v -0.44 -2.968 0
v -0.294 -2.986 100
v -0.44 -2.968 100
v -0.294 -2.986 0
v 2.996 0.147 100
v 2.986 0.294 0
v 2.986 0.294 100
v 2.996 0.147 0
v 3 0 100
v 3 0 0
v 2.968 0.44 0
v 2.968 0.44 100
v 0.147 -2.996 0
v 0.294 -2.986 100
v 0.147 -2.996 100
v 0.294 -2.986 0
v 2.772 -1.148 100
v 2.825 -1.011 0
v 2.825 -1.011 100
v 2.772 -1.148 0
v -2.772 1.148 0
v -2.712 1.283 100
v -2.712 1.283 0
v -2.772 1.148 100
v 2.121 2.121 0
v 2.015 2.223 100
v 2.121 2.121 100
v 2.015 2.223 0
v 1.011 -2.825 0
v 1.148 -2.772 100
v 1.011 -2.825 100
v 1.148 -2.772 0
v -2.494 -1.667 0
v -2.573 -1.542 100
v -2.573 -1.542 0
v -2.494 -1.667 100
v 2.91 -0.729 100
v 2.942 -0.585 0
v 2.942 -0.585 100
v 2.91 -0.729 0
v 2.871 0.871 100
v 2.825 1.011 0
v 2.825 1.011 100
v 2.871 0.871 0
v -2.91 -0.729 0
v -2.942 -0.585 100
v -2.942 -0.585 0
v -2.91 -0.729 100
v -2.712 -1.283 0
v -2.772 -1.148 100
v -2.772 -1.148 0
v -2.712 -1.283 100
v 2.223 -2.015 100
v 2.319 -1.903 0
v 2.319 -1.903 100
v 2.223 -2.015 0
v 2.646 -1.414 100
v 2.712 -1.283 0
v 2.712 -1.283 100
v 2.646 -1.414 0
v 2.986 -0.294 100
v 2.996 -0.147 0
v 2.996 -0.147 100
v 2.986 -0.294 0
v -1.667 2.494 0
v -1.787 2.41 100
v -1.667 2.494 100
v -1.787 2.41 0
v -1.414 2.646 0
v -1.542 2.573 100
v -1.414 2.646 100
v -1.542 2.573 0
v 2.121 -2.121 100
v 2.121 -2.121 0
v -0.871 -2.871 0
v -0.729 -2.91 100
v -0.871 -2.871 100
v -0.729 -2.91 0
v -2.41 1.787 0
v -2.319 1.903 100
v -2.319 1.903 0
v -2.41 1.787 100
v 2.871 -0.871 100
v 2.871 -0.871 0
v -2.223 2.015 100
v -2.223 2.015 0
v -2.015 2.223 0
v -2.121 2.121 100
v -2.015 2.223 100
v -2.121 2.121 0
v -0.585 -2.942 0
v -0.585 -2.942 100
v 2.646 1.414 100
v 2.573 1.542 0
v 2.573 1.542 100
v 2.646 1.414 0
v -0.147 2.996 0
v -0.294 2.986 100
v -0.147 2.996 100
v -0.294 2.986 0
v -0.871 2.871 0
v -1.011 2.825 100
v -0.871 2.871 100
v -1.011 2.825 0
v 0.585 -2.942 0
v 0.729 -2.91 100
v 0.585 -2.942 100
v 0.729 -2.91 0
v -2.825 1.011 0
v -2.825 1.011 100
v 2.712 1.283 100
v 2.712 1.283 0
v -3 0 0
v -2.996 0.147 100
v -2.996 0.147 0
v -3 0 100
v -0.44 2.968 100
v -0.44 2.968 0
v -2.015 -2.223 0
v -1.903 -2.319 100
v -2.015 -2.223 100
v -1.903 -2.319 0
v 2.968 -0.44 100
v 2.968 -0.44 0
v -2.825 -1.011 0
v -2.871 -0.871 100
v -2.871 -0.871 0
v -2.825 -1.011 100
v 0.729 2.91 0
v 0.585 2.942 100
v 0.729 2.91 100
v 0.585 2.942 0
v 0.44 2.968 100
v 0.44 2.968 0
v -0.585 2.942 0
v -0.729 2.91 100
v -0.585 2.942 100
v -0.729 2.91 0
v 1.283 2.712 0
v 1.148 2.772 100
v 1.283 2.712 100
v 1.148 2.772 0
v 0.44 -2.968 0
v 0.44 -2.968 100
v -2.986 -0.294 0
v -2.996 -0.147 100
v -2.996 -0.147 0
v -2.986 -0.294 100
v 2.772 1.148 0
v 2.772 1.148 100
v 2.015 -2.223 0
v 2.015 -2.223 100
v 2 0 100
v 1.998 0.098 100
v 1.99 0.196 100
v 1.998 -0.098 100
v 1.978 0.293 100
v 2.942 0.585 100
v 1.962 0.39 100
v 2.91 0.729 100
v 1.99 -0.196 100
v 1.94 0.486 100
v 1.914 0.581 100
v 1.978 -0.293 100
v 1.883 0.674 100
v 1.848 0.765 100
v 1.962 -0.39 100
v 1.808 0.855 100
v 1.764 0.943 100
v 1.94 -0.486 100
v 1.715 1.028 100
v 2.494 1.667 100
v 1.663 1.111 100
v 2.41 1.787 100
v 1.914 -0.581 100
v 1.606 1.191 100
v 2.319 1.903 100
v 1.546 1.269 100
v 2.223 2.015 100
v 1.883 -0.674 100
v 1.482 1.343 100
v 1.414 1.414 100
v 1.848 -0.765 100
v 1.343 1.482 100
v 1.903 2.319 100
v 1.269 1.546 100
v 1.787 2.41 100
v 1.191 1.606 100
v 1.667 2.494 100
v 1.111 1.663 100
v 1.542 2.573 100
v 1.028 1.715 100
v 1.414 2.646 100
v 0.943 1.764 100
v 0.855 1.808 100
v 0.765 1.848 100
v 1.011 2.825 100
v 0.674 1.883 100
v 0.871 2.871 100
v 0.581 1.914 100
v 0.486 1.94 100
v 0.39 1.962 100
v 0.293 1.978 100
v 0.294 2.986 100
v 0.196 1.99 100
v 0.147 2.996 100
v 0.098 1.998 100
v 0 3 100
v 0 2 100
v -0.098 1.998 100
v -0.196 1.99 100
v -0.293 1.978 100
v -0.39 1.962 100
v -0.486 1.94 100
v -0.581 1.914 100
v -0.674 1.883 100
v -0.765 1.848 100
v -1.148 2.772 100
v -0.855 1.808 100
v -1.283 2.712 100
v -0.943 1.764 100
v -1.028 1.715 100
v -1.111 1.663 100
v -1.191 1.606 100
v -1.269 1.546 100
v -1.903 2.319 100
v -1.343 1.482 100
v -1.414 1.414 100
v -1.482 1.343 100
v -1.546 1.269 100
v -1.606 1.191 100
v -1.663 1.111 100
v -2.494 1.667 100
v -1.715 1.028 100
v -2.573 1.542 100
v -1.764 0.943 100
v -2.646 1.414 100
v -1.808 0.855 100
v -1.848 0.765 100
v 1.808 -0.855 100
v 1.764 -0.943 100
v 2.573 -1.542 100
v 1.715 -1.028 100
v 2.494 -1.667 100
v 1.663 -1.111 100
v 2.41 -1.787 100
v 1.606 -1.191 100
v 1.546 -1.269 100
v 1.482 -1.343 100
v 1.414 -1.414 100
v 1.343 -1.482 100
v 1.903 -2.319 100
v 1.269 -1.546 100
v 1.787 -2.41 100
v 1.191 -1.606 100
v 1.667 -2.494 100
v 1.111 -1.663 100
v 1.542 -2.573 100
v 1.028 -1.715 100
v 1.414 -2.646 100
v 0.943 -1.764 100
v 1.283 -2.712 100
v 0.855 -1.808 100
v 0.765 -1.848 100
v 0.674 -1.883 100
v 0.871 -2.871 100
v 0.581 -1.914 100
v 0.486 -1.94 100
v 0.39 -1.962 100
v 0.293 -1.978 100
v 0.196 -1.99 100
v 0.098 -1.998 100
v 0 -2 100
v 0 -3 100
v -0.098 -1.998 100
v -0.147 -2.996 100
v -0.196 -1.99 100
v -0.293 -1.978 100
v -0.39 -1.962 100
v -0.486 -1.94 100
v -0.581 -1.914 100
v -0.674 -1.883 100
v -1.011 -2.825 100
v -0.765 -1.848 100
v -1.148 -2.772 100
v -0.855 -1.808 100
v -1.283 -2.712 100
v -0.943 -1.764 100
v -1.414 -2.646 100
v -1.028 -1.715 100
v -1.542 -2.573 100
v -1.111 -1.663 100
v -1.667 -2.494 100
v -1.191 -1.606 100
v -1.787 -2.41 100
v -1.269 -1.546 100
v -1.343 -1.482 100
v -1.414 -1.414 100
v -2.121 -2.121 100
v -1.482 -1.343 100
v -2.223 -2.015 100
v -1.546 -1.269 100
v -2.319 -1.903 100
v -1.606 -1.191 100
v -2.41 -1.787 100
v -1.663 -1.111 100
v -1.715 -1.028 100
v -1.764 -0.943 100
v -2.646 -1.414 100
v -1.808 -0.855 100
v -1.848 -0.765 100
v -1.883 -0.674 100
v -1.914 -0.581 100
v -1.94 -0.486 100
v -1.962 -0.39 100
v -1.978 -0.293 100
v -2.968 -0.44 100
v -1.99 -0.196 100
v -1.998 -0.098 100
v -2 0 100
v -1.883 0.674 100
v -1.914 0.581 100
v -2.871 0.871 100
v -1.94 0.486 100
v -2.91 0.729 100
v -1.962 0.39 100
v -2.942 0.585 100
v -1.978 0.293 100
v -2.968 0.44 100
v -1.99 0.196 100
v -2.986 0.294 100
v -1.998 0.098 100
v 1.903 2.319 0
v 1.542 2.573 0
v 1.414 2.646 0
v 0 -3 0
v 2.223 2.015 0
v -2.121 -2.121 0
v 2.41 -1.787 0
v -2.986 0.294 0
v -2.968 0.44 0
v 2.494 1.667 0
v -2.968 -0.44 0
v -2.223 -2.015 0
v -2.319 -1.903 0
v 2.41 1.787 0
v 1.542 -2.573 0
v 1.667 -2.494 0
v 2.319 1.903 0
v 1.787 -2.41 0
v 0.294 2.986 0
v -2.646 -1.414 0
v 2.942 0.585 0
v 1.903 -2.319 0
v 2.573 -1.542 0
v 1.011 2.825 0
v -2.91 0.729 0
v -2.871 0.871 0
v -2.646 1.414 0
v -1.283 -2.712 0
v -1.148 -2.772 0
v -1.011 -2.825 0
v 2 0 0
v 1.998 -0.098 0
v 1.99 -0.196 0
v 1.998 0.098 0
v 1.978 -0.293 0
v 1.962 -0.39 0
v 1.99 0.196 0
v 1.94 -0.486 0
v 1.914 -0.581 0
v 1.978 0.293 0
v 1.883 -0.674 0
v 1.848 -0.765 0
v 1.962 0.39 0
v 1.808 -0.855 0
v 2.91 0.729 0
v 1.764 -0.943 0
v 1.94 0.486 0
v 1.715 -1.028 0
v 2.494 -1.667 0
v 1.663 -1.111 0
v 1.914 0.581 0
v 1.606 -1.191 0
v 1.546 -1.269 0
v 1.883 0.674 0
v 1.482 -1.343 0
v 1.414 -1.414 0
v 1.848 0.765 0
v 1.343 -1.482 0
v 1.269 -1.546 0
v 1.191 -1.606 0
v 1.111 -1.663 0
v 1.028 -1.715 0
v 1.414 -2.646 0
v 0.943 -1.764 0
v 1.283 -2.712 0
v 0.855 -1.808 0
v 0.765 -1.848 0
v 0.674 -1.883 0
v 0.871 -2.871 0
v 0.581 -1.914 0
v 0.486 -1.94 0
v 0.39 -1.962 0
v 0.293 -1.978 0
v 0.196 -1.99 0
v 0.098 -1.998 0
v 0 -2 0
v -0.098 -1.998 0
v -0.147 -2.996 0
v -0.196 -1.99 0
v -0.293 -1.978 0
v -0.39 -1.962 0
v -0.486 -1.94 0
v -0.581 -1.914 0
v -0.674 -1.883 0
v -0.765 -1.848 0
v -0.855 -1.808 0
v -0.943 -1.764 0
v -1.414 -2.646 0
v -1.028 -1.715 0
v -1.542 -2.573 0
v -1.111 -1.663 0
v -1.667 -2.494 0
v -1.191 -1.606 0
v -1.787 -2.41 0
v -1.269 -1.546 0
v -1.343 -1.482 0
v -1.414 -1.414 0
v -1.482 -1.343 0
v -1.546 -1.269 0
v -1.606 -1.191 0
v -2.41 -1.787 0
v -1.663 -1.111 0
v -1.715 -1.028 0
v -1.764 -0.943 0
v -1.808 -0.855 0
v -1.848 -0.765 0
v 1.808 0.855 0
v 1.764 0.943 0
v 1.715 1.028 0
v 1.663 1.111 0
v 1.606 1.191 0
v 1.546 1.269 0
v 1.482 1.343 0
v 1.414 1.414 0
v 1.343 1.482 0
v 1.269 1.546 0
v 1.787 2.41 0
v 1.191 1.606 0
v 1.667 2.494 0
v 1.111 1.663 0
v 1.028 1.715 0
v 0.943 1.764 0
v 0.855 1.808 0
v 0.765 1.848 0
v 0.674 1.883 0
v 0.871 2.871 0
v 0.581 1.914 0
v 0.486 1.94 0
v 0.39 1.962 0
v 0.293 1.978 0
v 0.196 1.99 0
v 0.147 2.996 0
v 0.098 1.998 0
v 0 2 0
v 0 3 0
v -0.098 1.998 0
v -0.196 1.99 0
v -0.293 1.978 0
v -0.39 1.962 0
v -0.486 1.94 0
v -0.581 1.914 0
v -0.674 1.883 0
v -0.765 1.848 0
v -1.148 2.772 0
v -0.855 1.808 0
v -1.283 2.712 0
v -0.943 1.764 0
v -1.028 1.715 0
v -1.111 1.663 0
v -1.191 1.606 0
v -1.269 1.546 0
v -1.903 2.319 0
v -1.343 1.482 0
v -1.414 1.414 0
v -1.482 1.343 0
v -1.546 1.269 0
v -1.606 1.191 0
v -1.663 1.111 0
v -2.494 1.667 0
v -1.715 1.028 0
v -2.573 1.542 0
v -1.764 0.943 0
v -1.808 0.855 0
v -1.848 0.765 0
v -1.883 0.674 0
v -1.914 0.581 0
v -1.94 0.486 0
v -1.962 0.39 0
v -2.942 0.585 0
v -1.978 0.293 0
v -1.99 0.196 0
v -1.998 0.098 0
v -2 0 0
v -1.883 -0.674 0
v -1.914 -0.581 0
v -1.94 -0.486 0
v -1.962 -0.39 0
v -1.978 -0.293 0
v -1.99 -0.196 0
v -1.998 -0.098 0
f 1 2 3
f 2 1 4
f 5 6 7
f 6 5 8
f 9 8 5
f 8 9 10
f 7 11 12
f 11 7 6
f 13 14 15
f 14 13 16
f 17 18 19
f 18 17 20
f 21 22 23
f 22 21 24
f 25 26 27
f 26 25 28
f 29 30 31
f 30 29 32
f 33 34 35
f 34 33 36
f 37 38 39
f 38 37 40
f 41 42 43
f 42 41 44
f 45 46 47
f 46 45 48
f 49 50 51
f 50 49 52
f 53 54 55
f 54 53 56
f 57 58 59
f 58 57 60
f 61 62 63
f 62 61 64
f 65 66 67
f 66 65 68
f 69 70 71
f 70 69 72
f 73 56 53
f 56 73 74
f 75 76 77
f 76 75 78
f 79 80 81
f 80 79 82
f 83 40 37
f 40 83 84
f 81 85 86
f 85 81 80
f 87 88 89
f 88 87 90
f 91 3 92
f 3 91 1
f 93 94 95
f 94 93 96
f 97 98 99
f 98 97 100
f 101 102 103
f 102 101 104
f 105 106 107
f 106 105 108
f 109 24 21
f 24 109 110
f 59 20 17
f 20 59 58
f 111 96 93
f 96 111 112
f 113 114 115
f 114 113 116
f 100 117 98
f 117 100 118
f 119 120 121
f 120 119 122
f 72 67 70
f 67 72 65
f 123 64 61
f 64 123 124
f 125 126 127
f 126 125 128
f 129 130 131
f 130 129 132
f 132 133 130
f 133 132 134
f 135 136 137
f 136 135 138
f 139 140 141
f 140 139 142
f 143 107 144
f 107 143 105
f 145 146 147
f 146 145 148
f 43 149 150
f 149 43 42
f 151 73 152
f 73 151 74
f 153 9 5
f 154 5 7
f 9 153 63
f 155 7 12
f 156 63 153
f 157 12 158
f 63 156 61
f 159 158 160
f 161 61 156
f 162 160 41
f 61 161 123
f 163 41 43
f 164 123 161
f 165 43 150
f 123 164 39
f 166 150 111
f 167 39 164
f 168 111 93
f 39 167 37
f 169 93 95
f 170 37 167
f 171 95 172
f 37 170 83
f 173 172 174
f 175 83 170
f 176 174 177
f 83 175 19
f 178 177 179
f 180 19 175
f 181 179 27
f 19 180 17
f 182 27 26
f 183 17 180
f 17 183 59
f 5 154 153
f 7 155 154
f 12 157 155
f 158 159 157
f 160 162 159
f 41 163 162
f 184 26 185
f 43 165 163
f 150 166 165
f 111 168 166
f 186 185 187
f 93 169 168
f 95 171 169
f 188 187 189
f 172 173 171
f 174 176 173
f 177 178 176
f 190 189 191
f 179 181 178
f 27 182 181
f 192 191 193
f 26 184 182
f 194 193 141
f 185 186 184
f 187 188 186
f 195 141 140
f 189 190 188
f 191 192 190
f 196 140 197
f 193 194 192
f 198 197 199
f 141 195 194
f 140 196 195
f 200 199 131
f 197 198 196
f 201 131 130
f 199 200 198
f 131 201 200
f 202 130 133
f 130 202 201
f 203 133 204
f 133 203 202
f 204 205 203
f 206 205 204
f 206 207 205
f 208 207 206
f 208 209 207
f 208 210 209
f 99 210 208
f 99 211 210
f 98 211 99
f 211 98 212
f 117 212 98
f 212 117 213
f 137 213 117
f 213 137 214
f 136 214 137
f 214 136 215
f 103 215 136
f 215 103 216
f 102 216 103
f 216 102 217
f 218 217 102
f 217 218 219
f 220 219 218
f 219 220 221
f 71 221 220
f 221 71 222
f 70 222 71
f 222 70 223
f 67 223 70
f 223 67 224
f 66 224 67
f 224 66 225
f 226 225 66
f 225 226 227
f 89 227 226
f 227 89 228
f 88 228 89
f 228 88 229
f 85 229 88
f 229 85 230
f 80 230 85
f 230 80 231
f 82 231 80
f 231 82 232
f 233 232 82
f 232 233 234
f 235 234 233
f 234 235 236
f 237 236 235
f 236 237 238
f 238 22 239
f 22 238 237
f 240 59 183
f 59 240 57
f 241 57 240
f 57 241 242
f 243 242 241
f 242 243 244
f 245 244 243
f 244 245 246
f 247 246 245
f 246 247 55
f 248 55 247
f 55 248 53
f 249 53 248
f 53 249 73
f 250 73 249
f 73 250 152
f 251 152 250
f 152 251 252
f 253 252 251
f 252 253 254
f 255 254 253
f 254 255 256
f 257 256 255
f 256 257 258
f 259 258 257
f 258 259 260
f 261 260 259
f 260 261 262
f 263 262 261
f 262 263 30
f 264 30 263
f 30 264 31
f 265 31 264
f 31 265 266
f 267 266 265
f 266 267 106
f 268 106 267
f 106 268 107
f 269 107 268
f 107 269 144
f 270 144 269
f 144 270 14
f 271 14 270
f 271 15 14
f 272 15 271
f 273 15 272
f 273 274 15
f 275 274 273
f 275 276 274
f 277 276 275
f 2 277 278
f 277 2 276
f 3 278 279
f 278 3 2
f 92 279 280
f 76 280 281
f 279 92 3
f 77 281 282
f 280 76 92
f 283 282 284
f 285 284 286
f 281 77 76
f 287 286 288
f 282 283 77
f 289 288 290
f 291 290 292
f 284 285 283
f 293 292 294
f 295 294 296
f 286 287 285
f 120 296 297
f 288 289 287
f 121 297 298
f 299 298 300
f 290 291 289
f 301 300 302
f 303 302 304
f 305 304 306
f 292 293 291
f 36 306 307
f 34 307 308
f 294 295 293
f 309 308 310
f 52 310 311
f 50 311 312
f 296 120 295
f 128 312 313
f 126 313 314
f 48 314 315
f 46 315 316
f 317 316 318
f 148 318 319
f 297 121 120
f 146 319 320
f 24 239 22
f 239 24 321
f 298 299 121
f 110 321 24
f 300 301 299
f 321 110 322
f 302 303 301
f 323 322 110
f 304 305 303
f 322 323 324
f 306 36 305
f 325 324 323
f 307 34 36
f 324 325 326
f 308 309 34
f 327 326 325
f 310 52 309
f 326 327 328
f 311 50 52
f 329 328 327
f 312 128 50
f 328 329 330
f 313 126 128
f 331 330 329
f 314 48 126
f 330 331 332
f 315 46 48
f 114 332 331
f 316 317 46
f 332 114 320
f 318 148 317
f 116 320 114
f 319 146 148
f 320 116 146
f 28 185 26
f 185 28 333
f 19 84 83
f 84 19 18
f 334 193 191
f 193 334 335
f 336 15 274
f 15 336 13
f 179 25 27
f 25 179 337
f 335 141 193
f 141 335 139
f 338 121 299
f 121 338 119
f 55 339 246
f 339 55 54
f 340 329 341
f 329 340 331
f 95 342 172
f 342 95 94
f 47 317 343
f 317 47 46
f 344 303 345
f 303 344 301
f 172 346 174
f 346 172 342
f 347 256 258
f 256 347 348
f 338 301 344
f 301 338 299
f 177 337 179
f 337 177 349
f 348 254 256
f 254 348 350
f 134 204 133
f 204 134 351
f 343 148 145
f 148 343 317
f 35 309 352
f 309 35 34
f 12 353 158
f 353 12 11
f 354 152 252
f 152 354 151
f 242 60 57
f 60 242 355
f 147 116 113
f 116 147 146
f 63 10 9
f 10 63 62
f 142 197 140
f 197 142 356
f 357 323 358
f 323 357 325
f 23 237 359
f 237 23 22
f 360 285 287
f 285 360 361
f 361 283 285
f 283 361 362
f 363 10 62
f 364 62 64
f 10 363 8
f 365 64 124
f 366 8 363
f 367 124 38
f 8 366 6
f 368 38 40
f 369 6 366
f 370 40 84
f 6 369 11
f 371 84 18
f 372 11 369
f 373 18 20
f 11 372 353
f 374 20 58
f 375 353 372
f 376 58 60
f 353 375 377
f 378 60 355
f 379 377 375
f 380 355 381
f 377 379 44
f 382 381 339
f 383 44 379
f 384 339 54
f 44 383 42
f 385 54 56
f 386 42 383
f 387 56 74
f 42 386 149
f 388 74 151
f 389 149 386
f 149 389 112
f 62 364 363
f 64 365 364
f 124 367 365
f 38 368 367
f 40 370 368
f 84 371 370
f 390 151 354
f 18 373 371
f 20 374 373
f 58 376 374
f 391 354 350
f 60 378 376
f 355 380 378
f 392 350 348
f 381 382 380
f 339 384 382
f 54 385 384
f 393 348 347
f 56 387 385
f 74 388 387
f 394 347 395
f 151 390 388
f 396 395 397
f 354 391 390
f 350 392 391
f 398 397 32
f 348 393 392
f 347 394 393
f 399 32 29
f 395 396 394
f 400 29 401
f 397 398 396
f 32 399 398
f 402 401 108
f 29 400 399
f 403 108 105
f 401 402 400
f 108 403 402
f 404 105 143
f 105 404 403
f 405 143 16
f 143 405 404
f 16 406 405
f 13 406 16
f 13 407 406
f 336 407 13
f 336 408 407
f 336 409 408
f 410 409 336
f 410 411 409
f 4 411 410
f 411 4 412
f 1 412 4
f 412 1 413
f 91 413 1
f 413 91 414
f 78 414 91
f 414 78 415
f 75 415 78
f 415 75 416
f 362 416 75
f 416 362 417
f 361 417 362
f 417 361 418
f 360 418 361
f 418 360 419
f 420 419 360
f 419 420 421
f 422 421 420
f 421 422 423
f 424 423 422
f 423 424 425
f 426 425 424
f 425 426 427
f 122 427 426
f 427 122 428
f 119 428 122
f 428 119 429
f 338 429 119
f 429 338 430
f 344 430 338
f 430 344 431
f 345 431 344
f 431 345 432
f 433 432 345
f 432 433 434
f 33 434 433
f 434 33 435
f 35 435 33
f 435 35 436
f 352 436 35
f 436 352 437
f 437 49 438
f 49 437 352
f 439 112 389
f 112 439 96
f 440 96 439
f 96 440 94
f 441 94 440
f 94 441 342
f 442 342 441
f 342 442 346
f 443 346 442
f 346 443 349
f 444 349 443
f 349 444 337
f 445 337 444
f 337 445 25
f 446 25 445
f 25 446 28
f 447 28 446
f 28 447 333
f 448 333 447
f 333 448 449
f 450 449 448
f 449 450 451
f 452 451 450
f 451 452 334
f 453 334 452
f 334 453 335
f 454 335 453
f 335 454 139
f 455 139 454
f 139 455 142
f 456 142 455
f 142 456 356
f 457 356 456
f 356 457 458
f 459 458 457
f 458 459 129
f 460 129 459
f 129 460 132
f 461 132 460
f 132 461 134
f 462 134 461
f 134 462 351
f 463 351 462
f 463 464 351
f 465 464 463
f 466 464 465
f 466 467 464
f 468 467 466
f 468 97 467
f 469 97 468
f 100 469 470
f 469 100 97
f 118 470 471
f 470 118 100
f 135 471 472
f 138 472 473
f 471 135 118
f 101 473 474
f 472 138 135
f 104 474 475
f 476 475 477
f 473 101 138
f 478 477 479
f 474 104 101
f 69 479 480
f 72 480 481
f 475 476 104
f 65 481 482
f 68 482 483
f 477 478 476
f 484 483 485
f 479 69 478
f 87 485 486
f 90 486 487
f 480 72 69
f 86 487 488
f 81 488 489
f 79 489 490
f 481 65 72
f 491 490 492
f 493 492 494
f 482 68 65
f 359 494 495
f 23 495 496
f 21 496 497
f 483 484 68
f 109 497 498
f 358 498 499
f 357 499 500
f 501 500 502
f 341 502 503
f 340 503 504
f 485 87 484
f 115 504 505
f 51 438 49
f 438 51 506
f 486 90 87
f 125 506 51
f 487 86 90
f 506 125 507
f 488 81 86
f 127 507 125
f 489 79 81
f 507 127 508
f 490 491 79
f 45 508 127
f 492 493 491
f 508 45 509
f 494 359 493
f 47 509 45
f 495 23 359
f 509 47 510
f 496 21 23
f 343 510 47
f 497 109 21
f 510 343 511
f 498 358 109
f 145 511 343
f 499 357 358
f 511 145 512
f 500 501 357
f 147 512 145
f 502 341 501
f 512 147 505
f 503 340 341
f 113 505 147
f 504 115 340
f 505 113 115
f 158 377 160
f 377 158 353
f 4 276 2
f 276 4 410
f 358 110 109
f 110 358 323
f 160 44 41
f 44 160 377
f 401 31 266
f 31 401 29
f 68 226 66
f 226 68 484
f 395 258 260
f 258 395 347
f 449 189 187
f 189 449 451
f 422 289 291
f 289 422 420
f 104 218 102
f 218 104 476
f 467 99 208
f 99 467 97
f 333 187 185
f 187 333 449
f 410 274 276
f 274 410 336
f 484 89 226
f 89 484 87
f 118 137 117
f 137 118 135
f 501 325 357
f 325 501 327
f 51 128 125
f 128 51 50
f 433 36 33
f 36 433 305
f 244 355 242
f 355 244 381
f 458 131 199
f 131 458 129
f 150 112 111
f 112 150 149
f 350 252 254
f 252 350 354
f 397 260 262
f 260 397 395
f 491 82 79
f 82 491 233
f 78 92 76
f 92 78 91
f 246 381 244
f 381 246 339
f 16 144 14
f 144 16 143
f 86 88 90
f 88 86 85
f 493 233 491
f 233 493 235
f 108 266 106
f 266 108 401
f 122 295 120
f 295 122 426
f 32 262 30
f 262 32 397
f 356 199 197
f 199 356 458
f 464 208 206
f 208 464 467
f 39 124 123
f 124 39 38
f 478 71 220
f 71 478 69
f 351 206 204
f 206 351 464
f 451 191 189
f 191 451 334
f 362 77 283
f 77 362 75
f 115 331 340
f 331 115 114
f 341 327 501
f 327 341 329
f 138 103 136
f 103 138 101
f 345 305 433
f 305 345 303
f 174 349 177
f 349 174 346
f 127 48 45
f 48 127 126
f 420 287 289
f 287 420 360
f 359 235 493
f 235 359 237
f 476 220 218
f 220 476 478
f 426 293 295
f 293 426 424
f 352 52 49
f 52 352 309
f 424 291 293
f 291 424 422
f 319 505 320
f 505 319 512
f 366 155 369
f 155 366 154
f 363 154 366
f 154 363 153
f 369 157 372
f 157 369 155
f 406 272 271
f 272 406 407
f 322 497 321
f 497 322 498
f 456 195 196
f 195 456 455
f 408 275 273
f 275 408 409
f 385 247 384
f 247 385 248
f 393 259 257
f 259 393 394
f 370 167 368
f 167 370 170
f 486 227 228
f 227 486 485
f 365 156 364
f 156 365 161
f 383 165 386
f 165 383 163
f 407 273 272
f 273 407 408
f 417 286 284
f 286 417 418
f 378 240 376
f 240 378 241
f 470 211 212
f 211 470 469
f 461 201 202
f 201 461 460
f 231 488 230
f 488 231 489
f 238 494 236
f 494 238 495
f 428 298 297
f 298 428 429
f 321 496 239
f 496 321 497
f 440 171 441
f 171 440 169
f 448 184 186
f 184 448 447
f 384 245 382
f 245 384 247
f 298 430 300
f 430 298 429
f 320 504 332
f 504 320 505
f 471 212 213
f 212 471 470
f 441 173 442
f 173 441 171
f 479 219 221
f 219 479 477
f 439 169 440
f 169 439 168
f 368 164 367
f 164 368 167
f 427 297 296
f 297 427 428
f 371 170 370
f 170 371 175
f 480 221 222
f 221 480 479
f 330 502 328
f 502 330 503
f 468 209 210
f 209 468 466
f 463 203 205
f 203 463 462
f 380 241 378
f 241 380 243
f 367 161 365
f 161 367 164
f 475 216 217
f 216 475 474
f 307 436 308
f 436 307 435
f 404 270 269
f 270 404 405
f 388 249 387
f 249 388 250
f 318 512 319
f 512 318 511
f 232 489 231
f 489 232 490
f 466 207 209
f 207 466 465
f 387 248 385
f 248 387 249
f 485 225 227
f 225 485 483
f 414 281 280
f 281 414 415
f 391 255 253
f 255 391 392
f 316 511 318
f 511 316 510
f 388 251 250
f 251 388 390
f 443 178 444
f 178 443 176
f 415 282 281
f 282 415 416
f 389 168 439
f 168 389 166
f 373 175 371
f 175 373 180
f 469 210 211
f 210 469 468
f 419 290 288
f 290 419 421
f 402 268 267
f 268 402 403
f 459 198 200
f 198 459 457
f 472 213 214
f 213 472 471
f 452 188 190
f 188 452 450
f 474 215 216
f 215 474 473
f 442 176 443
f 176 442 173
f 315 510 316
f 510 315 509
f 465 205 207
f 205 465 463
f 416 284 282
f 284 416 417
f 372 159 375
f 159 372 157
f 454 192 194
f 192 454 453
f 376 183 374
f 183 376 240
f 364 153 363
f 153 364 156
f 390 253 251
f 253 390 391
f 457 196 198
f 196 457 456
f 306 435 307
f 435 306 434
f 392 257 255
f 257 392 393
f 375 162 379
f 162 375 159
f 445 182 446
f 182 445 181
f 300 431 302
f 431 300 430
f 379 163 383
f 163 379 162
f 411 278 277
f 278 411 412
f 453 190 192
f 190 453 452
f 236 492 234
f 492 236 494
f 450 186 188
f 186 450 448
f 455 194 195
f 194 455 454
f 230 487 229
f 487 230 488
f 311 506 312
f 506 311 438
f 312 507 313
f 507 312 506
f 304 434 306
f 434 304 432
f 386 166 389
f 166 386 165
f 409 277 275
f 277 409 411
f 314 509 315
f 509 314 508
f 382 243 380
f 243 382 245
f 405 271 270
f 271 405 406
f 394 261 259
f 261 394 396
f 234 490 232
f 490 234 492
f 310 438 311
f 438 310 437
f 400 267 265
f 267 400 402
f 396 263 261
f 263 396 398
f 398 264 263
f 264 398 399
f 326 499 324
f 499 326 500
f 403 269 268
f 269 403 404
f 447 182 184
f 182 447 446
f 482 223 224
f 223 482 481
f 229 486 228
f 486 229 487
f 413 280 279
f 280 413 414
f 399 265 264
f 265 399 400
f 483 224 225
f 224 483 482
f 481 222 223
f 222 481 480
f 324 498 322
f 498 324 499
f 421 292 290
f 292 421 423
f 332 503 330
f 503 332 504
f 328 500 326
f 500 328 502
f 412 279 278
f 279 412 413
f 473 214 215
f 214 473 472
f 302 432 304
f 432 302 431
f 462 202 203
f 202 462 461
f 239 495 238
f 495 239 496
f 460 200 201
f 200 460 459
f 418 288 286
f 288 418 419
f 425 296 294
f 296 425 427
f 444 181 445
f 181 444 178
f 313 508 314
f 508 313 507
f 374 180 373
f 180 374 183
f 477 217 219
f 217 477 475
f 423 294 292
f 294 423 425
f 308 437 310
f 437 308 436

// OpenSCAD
$fn = 128;

// PTFE sleeving (tubing) parameters (mm)
inner_d = 4.0;     // inner diameter
outer_d = 6.0;     // outer diameter
length  = 100.0;   // tube length

module ptfe_sleeving(id, od, h) {
    difference() {
        cylinder(h = h, d = od, center = false);
        translate([0,0,-0.5])
            cylinder(h = h + 1.0, d = id, center = false);
    }
}

ptfe_sleeving(inner_d, outer_d, length);
